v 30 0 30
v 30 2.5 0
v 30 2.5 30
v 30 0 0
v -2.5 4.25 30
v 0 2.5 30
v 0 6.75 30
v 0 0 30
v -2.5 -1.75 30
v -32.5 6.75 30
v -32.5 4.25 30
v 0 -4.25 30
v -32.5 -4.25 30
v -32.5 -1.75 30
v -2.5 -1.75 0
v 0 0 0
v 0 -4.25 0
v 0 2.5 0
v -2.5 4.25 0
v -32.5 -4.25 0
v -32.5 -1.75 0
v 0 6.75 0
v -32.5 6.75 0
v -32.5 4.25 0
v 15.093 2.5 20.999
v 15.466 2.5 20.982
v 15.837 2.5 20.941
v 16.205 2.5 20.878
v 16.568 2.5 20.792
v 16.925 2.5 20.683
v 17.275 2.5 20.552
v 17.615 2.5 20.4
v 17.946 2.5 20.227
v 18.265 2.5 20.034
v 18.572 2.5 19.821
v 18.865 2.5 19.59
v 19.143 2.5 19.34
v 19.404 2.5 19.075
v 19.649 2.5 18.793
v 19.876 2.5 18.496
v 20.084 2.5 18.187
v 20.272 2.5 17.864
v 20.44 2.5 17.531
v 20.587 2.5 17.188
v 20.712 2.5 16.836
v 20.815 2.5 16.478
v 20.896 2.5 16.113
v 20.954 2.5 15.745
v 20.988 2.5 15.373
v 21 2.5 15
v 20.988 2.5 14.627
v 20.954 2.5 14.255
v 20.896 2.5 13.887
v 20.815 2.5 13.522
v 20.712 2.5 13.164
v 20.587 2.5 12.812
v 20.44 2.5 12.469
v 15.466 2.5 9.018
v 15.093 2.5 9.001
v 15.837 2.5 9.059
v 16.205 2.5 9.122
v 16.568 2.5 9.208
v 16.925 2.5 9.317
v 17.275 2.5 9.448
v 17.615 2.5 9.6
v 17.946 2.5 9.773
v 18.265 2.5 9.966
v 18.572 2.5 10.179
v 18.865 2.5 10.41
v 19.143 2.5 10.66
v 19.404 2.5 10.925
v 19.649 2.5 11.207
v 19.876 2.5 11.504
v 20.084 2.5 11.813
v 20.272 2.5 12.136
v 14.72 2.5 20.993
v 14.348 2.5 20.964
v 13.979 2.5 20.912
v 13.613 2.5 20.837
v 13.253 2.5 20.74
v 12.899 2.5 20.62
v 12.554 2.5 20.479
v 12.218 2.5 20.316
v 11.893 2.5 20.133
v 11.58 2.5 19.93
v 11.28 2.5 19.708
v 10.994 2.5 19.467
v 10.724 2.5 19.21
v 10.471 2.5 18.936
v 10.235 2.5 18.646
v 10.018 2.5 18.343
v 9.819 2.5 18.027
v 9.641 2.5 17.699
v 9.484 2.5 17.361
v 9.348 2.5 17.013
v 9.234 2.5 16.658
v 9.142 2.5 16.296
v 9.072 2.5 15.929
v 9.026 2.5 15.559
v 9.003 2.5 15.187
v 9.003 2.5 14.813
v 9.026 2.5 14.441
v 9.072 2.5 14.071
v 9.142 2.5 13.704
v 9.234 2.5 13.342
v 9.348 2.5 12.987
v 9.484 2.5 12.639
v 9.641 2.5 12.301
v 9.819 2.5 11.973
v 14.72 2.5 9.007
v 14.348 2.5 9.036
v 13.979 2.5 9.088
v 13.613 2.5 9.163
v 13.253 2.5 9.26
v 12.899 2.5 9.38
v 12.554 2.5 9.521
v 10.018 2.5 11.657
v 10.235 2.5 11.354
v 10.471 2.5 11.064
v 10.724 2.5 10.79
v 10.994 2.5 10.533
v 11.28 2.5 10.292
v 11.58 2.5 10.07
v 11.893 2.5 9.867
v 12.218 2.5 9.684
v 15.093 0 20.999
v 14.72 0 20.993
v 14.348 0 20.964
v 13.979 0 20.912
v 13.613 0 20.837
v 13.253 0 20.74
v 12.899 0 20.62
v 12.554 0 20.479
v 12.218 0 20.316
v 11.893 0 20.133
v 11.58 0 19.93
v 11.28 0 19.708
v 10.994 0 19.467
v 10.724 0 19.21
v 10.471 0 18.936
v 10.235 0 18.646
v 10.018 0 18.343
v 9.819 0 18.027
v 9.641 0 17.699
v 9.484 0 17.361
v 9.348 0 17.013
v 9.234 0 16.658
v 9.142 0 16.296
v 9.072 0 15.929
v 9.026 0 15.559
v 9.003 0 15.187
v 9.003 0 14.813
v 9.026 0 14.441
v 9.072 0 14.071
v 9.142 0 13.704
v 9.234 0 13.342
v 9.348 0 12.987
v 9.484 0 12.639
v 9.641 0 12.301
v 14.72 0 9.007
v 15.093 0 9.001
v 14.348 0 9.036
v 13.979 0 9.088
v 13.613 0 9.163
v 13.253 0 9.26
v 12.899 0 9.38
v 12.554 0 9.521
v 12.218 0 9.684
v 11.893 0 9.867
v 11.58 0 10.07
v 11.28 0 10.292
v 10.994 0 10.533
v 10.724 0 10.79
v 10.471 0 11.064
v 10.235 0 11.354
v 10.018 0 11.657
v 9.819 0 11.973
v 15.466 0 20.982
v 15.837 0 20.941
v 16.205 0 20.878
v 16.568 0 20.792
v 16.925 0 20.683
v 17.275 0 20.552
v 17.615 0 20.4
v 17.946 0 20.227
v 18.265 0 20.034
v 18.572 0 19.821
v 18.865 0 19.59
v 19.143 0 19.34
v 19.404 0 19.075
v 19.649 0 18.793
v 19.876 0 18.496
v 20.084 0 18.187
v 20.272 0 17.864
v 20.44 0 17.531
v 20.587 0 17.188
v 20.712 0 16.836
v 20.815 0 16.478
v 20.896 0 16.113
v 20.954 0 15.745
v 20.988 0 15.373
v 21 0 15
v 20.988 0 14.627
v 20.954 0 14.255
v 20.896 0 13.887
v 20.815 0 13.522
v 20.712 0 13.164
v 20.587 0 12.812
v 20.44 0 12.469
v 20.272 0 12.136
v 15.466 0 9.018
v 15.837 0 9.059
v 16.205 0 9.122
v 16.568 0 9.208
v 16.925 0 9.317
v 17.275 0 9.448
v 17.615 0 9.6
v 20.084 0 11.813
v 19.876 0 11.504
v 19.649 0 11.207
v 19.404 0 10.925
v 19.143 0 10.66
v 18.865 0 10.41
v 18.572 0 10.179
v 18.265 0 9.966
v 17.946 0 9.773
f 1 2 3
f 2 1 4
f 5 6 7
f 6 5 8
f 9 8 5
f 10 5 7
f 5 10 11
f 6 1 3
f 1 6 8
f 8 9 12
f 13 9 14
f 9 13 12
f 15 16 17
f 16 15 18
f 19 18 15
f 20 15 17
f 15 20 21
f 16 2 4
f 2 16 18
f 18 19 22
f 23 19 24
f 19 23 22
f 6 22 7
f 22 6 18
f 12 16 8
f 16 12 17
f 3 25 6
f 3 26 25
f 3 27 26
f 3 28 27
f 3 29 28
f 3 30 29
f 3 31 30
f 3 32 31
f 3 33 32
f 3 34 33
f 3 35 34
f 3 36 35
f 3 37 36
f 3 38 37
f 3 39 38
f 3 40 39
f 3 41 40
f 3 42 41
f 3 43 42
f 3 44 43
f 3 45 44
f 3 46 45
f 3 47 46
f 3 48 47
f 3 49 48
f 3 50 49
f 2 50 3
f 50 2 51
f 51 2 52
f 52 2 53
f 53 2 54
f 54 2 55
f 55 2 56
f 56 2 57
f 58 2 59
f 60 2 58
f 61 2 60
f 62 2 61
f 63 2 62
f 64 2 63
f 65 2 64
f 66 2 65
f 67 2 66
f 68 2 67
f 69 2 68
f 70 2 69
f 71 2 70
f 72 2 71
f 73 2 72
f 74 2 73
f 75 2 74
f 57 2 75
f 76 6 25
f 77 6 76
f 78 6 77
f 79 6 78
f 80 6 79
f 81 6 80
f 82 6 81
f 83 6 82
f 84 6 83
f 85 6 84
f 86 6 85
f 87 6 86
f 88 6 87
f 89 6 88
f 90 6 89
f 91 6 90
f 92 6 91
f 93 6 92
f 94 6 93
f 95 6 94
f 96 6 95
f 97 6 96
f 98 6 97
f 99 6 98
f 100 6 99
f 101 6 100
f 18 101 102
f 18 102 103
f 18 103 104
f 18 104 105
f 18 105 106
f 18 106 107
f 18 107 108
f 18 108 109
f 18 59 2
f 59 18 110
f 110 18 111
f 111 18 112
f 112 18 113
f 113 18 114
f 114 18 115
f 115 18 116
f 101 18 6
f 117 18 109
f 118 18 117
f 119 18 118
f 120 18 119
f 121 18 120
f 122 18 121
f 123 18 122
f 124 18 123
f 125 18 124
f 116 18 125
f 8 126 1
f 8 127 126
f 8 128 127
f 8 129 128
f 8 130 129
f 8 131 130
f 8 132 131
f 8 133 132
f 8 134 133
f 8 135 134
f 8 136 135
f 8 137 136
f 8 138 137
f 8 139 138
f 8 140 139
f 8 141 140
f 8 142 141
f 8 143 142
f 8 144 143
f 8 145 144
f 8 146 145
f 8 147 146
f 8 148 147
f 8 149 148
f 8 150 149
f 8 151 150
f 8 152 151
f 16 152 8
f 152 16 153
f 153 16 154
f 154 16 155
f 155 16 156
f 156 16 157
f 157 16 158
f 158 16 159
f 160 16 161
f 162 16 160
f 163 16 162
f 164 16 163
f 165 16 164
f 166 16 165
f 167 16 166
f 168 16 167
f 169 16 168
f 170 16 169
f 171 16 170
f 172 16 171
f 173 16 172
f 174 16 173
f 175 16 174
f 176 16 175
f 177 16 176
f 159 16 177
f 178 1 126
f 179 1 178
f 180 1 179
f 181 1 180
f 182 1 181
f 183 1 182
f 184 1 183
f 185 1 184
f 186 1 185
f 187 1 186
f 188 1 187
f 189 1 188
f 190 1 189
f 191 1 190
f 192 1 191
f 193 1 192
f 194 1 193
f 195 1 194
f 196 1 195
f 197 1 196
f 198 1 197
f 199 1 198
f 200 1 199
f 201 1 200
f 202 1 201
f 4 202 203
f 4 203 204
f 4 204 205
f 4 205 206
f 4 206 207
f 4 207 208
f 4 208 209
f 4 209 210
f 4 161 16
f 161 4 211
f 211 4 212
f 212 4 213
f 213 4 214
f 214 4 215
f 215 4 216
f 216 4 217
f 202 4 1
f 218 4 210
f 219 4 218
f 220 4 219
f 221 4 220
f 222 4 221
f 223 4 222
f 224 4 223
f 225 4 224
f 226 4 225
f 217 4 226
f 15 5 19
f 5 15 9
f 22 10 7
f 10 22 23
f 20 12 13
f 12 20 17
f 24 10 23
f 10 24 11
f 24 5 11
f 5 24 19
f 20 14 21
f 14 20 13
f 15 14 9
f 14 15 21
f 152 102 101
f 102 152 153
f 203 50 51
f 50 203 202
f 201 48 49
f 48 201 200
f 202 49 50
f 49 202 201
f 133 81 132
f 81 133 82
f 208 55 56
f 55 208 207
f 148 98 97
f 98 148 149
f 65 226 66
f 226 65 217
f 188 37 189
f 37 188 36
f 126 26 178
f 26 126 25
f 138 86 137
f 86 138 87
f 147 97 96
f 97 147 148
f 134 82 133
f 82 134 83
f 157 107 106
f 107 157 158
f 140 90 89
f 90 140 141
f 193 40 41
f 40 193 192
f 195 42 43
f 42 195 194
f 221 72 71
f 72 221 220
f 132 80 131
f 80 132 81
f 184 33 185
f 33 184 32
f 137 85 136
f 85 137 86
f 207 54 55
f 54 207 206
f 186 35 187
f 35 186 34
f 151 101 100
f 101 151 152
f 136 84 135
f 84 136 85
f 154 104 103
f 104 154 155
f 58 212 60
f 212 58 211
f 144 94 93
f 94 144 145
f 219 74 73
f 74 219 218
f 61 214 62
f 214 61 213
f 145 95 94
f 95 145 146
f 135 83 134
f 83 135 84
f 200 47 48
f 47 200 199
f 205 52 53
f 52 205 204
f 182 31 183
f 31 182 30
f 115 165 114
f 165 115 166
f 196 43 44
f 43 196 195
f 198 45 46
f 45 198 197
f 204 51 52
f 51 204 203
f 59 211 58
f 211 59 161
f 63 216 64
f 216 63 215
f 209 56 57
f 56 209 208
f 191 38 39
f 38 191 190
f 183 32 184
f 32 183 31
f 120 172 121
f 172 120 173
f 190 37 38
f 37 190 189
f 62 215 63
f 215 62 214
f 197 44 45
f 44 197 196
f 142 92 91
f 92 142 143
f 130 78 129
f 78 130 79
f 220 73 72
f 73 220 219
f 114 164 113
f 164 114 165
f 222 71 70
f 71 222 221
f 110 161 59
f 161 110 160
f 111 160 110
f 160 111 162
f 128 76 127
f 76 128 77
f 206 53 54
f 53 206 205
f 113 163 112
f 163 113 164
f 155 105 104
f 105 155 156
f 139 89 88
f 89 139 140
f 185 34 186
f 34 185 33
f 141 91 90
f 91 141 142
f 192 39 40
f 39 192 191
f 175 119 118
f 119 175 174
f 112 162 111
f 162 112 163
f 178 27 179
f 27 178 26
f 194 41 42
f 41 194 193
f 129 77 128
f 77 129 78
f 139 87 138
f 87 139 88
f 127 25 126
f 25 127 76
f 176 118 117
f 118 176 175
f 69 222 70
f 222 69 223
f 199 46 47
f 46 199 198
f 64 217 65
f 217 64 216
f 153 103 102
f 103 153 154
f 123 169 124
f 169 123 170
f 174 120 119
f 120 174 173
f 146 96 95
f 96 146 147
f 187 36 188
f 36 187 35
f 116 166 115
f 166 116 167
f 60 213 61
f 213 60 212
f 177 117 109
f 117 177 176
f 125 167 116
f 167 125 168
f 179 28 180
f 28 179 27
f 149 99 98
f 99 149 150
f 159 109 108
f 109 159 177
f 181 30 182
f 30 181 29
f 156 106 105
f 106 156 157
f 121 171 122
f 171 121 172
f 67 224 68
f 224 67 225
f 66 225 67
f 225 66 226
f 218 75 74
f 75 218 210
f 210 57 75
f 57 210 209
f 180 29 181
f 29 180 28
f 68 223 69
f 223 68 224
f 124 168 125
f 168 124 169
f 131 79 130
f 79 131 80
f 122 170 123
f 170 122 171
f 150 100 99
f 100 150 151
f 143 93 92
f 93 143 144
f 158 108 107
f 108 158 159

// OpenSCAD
tank_wall_thickness = 6;
valve_outer_diameter = 30;
throughole_diameter = 12;
wall_thickness = 2.5;
leg_length = 30;

$fn=101;

difference() {
    union() {
        cube([valve_outer_diameter, wall_thickness, valve_outer_diameter]);
        translate([-wall_thickness, -tank_wall_thickness/2-wall_thickness/2, 0]) cube([wall_thickness, tank_wall_thickness+2*wall_thickness, valve_outer_diameter]);
        translate([-valve_outer_diameter-wall_thickness, tank_wall_thickness/2+wall_thickness/2, 0]) cube([valve_outer_diameter, wall_thickness, valve_outer_diameter]);
        translate([-valve_outer_diameter-wall_thickness, -tank_wall_thickness/2-wall_thickness/2, 0]) cube([valve_outer_diameter, wall_thickness, valve_outer_diameter]);
    }
    translate([valve_outer_diameter/2, 5, valve_outer_diameter/2]) rotate([90, 0, 0]) cylinder(r=throughole_diameter/2, h=10);
}
